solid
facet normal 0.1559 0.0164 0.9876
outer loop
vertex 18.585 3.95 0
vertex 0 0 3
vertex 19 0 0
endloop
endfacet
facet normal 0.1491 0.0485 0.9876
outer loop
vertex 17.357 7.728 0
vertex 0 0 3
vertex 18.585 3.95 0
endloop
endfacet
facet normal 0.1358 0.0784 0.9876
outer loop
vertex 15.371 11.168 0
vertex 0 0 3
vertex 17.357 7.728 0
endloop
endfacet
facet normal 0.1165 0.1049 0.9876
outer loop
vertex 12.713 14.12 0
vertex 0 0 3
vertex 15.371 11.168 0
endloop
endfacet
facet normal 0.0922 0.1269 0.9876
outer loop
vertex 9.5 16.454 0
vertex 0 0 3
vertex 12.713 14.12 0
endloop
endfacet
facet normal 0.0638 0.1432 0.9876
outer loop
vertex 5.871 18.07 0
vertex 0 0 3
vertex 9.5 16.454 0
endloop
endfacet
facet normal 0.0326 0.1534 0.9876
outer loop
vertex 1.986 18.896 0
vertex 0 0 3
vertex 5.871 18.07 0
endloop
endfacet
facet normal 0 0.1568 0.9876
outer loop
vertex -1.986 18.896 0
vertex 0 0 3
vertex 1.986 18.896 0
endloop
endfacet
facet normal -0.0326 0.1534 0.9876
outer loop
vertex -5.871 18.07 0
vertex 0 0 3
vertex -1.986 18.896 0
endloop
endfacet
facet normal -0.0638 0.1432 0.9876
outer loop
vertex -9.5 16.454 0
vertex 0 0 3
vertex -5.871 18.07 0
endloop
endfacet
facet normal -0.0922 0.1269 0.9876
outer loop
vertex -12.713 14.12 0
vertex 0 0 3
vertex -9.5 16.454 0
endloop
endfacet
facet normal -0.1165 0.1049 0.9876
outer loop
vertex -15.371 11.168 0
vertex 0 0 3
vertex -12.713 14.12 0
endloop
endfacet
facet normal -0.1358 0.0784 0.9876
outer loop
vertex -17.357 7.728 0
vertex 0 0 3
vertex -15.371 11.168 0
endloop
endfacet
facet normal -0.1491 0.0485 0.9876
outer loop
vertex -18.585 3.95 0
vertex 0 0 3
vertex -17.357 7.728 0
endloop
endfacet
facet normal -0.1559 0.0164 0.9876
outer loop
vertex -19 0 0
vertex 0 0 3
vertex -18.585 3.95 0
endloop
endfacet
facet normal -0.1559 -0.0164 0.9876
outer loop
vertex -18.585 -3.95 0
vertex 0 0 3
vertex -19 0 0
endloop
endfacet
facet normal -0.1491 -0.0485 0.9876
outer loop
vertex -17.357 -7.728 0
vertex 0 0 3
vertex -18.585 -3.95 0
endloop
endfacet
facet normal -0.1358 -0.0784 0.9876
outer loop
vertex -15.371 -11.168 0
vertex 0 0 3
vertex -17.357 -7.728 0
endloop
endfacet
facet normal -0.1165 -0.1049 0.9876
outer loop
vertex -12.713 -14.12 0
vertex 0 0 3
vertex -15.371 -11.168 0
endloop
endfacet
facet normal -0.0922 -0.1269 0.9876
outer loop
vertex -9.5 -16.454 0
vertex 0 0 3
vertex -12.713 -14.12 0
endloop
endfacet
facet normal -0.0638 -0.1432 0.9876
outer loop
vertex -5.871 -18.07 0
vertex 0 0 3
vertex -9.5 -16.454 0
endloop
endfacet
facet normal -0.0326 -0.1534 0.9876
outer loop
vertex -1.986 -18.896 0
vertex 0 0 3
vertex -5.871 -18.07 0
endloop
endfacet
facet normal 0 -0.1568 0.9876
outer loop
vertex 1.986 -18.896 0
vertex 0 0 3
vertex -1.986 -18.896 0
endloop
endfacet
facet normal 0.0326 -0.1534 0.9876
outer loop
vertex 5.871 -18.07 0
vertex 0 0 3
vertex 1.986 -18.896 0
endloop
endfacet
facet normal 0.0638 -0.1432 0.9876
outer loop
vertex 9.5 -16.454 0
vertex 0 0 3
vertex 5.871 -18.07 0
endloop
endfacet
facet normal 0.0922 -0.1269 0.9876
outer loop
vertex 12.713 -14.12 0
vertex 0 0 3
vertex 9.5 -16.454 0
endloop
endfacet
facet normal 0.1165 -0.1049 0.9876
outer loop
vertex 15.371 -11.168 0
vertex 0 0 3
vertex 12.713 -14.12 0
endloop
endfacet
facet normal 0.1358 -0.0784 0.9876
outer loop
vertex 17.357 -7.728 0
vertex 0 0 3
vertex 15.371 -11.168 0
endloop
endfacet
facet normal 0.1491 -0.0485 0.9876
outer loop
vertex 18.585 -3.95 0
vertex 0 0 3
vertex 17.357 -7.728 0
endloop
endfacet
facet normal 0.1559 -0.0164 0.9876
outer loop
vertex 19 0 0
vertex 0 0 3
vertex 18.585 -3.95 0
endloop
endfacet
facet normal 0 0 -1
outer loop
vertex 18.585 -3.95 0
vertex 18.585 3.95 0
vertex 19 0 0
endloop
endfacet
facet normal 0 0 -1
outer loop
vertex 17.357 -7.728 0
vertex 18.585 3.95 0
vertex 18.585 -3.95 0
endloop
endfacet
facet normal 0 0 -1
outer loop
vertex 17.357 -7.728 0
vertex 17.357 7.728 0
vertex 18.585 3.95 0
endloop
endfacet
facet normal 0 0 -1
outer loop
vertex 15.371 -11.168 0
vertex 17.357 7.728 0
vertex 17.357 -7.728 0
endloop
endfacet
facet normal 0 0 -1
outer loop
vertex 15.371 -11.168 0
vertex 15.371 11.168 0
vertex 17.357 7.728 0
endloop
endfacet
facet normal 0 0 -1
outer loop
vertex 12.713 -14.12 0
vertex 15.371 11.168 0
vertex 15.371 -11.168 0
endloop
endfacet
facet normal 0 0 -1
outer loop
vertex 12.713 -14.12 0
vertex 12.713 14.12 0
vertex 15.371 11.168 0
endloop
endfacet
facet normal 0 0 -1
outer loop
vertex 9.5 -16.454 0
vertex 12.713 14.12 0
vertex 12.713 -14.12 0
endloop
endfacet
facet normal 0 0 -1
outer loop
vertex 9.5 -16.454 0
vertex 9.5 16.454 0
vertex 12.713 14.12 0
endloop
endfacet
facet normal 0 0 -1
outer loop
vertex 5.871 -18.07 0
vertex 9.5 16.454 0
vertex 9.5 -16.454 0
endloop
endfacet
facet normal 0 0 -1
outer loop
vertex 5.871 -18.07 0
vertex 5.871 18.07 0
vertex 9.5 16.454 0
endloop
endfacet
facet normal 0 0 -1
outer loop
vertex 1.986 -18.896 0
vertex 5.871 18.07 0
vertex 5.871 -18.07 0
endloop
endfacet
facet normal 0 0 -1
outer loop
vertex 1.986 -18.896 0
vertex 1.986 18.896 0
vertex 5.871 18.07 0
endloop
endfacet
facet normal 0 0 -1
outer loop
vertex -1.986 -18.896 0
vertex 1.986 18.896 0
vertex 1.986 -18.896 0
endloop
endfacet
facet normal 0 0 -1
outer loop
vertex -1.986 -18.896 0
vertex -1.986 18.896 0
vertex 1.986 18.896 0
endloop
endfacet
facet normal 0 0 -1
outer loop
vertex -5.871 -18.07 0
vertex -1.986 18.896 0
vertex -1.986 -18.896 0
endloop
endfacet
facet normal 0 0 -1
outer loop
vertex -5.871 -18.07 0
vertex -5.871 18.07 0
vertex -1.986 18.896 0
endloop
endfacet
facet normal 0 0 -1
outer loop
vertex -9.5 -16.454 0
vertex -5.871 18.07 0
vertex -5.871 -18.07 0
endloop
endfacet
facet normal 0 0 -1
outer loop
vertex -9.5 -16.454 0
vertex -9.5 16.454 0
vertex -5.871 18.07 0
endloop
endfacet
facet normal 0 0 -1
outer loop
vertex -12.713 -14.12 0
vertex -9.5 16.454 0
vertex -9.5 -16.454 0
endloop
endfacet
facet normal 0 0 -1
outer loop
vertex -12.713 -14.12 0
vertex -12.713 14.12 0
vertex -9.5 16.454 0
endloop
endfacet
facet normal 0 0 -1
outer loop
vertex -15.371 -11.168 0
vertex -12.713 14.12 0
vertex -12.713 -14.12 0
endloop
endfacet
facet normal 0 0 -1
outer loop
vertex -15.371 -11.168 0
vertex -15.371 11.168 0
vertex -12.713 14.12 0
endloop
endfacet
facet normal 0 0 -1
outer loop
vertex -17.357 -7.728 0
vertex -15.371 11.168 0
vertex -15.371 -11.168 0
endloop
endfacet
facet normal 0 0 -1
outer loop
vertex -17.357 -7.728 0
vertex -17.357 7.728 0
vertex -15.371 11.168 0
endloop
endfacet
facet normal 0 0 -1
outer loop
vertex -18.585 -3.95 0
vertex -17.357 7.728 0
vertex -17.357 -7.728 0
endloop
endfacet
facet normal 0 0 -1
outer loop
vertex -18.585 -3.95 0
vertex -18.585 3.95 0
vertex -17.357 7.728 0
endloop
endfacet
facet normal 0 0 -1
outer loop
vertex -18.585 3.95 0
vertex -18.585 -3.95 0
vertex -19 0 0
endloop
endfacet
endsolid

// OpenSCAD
// Generated by SolidPython 1.0.1 on 2020-07-29 00:39:25


cylinder(h = 3, r1 = 19, r2 = 0);
/***********************************************
*********      SolidPython code:      **********
************************************************
 
# import packages: SolidPython
from solid import *
from solid.utils import *
from itertools import chain, combinations


class Resize:

    def __init__(self, scad_file):
        self.scad_file = scad_file
        #self.scad_file = import_scad(scad_file)
        # cone/cylinder param:
        self.r1 = 0
        self.r2 = 0
        self.h = 0
        # rectangular prism param:
        self.w = 0
        self.l = 0
        # ellipse param:
        self.r = 0

    # import OpenScad code (file name corresponds to shape)


    # classify shape + parameters
    def assign(self, param1, param2, param3):
        if self.scad_file == 'cone.scad':
            self.r1 = param1
            self.r2 = param2
            self.h = param3
        elif self.scad_file == 'cylinder.scad':
            self.r1 = param1
            self.r2 = param2
            self.h = param3
        elif self.scad_file == 'rectangularPrism.scad':
            self.h = param1
            self.l = param2
            self.w = param3
        else:
            self.r = param1
            self.h = param2

    # resize parameters
    def iterate(self):
        x = range(3, 20, 2)
        i = 1
        if self.scad_file == 'cone.scad':
            tempList = list(combinations(x, 2))
            for temp in tempList:
                param1 = temp[0]
                param2 = temp[1]
                filepath = 'produced_scad_files/' + 'cone' + str(param1) + '_' + str(param2) + '_' + '.scad'
                scad_render_to_file(cylinder(h=param1, r1=param2, r2=0), filepath)

        elif self.scad_file == 'cylinder.scad':
            tempList = list(combinations(x, 3))
            for temp in tempList:
                param1 = temp[0]
                param2 = temp[1]
                filepath = 'produced_scad_files/' + 'cylinder' + str(param1) + '_' + str(param2) + '_' + '.scad'
                scad_render_to_file(cylinder(h=param1, r1=param2, r2=param2), filepath)

        elif self.scad_file == 'rectangularPrism.scad':
            tempList = list(combinations(x, 3))
            for temp in tempList:
                param1 = temp[0]
                param2 = temp[1]
                param3 = temp[2]
                filepath = 'produced_scad_files/' + 'rectangularPrism' + str(param1) + '_' + str(param2) + '_' + str(
                    param3) + '.scad'
                scad_render_to_file(cube(size=(param1, param2, param3)), filepath)

        elif self.scad_file == 'ellipse.scad':
            tempList = list(combinations(x, 4))
            for temp in tempList:
                param1 = temp[0]
                param2 = temp[1]
                param3 = temp[2]
                param4 = temp[3]
                filepath = 'produced_scad_files/' + 'ellipse' + str(param1) + '_' + str(param2) + '_' + str(param3) + '_' + str(param4) + '.scad'
                scad_render_to_file(scale([param1, param2, param3])(sphere(r=param4)), filepath)

    def render_to_scadfile(self):
        scad_render_to_file(scad, 'example.scad') 
 
************************************************/
